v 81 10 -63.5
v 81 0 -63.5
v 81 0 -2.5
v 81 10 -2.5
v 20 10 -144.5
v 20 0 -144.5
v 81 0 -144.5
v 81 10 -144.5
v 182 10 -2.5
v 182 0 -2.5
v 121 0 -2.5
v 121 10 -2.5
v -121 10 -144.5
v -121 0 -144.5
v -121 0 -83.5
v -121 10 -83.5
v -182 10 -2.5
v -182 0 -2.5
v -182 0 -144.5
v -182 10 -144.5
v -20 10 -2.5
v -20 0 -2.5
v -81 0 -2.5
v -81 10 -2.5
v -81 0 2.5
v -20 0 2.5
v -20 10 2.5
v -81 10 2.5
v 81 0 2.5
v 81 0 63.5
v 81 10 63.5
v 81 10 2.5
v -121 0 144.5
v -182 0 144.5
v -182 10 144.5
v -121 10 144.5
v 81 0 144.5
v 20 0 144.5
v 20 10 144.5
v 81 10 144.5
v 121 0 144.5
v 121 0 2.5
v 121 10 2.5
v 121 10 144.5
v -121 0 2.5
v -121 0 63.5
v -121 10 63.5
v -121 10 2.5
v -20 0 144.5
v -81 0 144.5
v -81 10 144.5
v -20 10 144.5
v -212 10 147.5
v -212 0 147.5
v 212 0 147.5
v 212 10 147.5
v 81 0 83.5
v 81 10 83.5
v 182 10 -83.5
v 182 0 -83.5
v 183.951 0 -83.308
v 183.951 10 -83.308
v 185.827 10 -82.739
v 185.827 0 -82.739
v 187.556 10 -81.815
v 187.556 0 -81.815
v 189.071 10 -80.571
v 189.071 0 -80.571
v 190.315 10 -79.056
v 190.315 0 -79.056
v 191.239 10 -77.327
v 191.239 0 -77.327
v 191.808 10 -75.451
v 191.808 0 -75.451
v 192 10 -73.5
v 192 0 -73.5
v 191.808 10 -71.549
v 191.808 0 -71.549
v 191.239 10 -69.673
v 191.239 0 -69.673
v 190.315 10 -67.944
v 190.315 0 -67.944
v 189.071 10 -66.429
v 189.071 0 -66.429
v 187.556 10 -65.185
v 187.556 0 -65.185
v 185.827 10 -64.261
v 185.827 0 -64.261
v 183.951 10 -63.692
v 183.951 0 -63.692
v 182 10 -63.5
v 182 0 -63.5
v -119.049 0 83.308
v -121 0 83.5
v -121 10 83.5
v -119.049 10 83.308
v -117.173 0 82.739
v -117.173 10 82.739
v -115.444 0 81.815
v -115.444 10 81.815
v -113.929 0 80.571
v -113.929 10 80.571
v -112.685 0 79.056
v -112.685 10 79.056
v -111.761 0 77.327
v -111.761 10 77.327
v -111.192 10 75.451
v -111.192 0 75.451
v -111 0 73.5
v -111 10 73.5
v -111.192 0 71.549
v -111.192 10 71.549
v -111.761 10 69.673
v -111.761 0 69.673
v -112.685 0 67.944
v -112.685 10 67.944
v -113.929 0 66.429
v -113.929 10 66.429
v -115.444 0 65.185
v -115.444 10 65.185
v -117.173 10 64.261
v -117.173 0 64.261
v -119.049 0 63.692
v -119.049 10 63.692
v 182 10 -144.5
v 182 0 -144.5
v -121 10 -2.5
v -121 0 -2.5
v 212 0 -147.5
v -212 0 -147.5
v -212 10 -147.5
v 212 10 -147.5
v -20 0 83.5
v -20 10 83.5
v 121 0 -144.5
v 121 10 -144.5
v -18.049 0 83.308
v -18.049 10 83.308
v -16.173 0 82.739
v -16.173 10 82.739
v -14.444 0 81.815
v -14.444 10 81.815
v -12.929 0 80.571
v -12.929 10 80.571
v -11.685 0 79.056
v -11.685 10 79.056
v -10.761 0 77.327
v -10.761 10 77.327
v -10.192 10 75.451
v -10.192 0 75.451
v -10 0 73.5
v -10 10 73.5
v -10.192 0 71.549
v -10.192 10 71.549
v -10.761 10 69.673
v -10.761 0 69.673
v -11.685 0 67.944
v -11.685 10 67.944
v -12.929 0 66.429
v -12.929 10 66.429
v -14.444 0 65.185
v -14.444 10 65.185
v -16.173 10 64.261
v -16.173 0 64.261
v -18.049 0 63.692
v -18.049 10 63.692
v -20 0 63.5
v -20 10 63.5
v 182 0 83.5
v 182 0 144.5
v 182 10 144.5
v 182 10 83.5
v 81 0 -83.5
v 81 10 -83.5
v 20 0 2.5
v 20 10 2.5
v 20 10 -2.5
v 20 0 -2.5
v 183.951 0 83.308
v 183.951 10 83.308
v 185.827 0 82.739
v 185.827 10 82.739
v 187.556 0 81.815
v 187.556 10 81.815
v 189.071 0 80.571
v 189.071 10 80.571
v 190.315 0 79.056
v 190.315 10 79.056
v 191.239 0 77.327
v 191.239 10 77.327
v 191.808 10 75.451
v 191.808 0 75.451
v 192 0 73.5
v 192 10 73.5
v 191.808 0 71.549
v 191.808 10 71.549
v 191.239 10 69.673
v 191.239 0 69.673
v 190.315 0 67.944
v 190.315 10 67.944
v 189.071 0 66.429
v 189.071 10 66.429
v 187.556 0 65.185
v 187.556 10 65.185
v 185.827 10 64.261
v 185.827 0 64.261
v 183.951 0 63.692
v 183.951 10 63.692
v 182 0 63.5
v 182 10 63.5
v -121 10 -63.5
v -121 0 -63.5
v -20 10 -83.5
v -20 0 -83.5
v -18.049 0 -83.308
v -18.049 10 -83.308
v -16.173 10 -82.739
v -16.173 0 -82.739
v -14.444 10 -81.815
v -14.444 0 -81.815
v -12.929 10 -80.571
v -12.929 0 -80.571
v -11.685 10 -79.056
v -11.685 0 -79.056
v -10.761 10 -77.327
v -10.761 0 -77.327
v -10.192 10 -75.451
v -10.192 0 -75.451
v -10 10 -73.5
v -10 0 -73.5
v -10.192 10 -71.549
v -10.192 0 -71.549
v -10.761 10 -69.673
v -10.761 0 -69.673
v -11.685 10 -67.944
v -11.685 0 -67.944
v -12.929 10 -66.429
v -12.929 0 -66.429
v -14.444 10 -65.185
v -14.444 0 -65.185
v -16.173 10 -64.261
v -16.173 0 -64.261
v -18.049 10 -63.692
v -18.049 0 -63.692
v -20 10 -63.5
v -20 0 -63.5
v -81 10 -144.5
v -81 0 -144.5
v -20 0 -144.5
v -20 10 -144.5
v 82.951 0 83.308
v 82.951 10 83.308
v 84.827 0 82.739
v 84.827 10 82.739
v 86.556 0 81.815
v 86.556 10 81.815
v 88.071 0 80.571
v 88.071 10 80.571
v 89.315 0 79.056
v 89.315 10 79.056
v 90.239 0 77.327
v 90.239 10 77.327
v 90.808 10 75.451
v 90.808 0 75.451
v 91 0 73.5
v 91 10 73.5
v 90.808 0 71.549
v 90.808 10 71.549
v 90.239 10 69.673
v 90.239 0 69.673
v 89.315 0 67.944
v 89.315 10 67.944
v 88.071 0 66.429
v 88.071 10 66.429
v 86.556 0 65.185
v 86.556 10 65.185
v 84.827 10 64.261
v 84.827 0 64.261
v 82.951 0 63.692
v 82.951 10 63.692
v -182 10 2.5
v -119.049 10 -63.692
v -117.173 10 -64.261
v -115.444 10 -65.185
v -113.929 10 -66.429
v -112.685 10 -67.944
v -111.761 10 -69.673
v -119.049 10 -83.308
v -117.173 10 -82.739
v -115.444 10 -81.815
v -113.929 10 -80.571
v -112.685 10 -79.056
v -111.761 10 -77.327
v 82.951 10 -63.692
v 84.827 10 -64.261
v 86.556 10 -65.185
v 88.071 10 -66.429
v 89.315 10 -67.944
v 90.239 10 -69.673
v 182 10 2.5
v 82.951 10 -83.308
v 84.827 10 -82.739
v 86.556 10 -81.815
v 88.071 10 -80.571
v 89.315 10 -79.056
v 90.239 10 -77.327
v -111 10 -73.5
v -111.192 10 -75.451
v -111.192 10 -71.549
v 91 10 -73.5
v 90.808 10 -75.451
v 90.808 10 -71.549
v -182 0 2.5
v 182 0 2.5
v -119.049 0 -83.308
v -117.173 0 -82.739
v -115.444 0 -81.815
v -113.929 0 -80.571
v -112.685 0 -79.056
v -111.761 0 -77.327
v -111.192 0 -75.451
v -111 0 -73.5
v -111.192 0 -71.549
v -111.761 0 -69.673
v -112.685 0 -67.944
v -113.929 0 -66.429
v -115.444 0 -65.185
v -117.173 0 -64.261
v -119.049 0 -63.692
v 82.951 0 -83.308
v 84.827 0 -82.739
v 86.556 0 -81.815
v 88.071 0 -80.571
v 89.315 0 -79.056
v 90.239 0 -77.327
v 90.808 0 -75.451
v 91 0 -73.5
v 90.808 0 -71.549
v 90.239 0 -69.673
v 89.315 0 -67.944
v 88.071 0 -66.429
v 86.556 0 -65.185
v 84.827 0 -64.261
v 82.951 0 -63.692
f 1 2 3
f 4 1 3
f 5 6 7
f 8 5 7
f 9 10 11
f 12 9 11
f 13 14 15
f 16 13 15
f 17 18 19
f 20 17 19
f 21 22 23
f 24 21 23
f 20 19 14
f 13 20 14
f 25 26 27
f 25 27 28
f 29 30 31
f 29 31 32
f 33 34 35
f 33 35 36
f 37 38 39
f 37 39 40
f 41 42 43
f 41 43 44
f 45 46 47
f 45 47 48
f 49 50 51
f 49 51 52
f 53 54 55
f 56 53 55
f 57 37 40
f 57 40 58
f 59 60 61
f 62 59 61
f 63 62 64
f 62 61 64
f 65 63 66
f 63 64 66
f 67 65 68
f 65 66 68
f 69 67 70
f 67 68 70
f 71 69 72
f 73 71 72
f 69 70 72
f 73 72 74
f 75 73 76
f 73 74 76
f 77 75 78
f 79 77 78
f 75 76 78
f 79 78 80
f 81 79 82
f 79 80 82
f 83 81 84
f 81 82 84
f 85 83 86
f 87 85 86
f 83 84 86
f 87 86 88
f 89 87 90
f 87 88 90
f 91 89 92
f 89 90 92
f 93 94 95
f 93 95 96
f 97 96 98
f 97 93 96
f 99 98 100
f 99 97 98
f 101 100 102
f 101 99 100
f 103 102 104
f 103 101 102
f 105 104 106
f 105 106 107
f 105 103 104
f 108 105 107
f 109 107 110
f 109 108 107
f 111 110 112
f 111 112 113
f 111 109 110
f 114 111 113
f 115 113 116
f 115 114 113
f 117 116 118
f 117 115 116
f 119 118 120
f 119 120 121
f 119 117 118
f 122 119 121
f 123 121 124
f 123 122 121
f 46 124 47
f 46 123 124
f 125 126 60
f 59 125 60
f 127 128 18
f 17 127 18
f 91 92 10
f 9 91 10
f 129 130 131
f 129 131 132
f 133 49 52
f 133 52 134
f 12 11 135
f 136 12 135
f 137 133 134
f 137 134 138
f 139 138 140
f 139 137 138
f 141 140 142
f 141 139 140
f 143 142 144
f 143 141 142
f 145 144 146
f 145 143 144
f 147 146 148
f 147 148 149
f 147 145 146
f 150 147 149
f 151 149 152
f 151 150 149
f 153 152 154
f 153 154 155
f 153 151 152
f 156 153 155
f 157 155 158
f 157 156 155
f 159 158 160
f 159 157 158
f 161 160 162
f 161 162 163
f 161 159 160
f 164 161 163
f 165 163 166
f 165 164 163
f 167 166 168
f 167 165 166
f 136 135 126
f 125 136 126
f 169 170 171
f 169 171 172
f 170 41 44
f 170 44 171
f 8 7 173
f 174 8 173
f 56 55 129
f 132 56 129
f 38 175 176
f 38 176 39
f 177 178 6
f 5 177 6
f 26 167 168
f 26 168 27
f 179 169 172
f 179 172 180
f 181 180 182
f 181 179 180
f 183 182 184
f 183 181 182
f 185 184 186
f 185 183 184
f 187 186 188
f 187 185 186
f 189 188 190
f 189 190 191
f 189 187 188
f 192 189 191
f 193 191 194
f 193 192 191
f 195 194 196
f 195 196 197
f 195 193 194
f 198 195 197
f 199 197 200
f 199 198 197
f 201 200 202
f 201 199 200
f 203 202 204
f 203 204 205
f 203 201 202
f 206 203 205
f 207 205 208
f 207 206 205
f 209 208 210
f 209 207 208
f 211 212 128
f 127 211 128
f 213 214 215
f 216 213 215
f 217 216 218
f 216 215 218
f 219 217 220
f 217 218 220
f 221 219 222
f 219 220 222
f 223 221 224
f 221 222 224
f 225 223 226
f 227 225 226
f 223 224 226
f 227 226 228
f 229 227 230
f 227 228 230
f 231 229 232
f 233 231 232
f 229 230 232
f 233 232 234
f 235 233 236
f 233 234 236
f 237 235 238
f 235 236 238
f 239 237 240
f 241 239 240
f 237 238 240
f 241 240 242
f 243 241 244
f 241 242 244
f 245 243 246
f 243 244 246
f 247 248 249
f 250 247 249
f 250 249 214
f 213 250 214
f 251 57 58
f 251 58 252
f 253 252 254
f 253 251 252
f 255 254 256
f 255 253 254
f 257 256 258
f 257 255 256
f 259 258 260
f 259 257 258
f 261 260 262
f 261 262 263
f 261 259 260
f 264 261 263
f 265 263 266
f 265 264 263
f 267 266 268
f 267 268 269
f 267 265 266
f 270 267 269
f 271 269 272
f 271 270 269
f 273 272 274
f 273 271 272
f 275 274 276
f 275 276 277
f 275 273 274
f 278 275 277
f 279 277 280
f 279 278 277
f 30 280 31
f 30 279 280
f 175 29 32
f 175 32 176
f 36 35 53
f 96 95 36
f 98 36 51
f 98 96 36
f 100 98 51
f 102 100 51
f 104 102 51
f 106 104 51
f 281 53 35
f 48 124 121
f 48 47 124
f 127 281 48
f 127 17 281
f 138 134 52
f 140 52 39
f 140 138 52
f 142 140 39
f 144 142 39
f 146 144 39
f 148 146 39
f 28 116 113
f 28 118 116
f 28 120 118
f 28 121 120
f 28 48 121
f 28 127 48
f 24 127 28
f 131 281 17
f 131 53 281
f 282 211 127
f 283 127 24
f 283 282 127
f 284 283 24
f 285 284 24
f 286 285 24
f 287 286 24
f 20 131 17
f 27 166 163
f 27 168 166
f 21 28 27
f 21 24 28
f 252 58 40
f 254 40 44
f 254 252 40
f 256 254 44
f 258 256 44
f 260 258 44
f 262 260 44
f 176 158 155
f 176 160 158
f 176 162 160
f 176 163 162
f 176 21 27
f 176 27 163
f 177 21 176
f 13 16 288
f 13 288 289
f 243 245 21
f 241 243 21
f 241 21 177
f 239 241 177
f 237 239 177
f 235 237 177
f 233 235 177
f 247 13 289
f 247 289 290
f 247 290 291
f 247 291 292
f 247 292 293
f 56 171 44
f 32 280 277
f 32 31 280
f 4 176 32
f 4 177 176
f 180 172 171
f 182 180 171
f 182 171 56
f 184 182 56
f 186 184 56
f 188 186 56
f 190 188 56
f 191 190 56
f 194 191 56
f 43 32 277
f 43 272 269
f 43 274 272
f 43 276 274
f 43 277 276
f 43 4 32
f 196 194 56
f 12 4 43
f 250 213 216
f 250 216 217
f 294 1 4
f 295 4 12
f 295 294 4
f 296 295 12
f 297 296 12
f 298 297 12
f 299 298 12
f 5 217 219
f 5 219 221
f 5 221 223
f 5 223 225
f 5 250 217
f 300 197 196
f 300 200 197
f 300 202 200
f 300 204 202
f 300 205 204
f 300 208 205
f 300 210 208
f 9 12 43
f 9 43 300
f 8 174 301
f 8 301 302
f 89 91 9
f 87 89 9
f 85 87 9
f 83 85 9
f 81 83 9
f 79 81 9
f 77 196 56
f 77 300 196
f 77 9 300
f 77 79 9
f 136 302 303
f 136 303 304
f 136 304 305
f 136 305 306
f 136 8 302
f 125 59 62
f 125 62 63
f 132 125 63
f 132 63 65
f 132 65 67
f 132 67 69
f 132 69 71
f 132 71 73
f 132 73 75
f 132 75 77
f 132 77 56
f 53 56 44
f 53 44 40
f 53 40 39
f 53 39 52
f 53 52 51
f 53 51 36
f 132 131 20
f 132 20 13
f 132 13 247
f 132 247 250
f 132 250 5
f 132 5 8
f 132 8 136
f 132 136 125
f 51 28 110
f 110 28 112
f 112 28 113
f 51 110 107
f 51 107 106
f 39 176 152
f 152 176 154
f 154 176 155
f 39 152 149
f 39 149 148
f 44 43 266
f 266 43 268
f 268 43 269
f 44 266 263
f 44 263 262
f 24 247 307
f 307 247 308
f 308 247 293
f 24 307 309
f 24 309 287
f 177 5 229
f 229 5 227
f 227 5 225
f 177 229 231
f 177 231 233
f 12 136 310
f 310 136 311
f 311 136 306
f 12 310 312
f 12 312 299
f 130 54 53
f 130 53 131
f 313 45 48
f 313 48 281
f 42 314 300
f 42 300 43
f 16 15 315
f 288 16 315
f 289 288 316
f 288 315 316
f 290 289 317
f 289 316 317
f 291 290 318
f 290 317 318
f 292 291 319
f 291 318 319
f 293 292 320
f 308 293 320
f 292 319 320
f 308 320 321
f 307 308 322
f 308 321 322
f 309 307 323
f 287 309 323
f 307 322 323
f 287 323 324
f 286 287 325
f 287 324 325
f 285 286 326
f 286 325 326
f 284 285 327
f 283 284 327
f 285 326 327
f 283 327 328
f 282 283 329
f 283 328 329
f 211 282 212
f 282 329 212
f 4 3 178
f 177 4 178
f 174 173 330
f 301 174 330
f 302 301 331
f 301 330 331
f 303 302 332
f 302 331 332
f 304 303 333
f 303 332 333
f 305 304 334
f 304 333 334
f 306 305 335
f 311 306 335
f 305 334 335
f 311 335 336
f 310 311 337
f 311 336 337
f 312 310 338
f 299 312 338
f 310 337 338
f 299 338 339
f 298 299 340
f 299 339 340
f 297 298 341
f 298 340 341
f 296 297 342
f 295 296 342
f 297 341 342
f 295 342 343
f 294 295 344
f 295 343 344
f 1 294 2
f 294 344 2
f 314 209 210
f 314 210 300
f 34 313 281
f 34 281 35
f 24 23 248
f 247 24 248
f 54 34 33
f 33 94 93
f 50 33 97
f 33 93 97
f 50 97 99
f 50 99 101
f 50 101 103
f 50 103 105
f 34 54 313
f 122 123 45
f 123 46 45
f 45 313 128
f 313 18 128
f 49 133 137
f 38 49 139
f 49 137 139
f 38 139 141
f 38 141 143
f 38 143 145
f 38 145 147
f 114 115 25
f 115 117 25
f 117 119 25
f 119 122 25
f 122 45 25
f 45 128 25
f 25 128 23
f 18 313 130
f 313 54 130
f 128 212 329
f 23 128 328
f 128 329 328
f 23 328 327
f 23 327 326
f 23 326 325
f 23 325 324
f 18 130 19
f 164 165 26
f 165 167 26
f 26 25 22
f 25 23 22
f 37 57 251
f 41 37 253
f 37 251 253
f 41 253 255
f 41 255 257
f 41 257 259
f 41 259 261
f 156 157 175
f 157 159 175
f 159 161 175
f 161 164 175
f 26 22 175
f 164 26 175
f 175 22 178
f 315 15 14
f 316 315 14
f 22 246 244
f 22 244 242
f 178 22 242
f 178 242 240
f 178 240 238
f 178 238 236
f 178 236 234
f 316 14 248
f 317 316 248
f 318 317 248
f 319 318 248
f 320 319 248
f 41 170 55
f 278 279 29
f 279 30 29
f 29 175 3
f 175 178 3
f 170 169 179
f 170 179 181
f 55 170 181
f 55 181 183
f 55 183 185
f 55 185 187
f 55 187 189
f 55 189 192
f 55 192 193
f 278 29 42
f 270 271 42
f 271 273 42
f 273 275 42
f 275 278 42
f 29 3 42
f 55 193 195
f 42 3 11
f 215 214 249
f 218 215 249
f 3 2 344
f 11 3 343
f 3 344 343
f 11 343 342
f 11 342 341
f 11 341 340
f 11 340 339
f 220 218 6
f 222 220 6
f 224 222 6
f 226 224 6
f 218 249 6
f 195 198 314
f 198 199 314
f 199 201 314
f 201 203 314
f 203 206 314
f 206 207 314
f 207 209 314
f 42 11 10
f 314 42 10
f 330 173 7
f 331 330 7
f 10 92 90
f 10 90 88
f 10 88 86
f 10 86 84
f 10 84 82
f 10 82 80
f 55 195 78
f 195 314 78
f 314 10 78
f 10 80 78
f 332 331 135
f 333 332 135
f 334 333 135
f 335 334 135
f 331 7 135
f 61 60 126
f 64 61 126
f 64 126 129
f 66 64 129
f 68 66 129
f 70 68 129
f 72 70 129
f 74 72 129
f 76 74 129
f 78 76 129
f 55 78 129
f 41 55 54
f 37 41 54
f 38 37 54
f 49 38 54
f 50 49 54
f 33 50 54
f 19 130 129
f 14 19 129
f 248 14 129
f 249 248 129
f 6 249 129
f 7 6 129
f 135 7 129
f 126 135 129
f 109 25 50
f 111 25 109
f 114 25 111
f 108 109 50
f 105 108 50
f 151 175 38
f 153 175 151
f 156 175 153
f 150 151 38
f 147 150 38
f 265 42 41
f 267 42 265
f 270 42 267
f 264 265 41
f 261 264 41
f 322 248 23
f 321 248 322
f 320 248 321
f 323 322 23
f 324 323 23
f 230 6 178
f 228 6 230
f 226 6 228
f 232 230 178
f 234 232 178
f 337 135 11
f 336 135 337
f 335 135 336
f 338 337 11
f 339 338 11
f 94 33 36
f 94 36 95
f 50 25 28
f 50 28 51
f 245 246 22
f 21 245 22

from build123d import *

# Parameters (mm, degrees)
SKETCH1_W           = 424
SKETCH1_H           = 295
BOSS_EXTRUDE1_DEPTH = 10


with BuildPart() as part:
    # Sketch1 → Boss-Extrude1 (new body)
    with BuildSketch(Plane(origin=(0, 0, 0), x_dir=(1, 0, 0), z_dir=(0, 1, 0))):
        Rectangle(SKETCH1_W, SKETCH1_H)
        with BuildLine():
            Line((-182, 144.5), (-121, 144.5))
            Line((-121, 144.5), (-121, 83.5))
            ThreePointArc((-121, 83.5), (-111, 73.5), (-121, 63.5))
            Line((-121, 63.5), (-121, 2.5))
            Line((-121, 2.5), (-182, 2.5))
            Line((-182, 2.5), (-182, 144.5))
        make_face(mode=Mode.SUBTRACT)
        with BuildLine():
            Line((-20, 63.5), (-20, 2.5))
            Line((-20, 2.5), (-81, 2.5))
            Line((-81, 2.5), (-81, 144.5))
            Line((-81, 144.5), (-20, 144.5))
            Line((-20, 144.5), (-20, 83.5))
            ThreePointArc((-20, 83.5), (-10, 73.5), (-20, 63.5))
        make_face(mode=Mode.SUBTRACT)
        with BuildLine():
            Line((81, 63.5), (81, 2.5))
            Line((81, 2.5), (20, 2.5))
            Line((20, 2.5), (20, 144.5))
            Line((20, 144.5), (81, 144.5))
            Line((81, 144.5), (81, 83.5))
            ThreePointArc((81, 83.5), (91, 73.5), (81, 63.5))
        make_face(mode=Mode.SUBTRACT)
        with BuildLine():
            Line((182, 63.5), (182, 2.5))
            Line((182, 2.5), (121, 2.5))
            Line((121, 2.5), (121, 144.5))
            Line((121, 144.5), (182, 144.5))
            Line((182, 144.5), (182, 83.5))
            ThreePointArc((182, 83.5), (192, 73.5), (182, 63.5))
        make_face(mode=Mode.SUBTRACT)
        with BuildLine():
            Line((-20, -63.5), (-20, -2.5))
            Line((-20, -2.5), (-81, -2.5))
            Line((-81, -2.5), (-81, -144.5))
            Line((-81, -144.5), (-20, -144.5))
            Line((-20, -144.5), (-20, -83.5))
            ThreePointArc((-20, -83.5), (-10, -73.5), (-20, -63.5))
        make_face(mode=Mode.SUBTRACT)
        with BuildLine():
            Line((-121, -144.5), (-121, -83.5))
            ThreePointArc((-121, -83.5), (-111, -73.5), (-121, -63.5))
            Line((-121, -63.5), (-121, -2.5))
            Line((-121, -2.5), (-182, -2.5))
            Line((-182, -2.5), (-182, -144.5))
            Line((-182, -144.5), (-121, -144.5))
        make_face(mode=Mode.SUBTRACT)
        with BuildLine():
            Line((81, -63.5), (81, -2.5))
            Line((81, -2.5), (20, -2.5))
            Line((20, -2.5), (20, -144.5))
            Line((20, -144.5), (81, -144.5))
            Line((81, -144.5), (81, -83.5))
            ThreePointArc((81, -83.5), (91, -73.5), (81, -63.5))
        make_face(mode=Mode.SUBTRACT)
        with BuildLine():
            Line((182, -63.5), (182, -2.5))
            Line((182, -2.5), (121, -2.5))
            Line((121, -2.5), (121, -144.5))
            Line((121, -144.5), (182, -144.5))
            Line((182, -144.5), (182, -83.5))
            ThreePointArc((182, -83.5), (192, -73.5), (182, -63.5))
        make_face(mode=Mode.SUBTRACT)
    extrude(amount=BOSS_EXTRUDE1_DEPTH)


solid = part.part
